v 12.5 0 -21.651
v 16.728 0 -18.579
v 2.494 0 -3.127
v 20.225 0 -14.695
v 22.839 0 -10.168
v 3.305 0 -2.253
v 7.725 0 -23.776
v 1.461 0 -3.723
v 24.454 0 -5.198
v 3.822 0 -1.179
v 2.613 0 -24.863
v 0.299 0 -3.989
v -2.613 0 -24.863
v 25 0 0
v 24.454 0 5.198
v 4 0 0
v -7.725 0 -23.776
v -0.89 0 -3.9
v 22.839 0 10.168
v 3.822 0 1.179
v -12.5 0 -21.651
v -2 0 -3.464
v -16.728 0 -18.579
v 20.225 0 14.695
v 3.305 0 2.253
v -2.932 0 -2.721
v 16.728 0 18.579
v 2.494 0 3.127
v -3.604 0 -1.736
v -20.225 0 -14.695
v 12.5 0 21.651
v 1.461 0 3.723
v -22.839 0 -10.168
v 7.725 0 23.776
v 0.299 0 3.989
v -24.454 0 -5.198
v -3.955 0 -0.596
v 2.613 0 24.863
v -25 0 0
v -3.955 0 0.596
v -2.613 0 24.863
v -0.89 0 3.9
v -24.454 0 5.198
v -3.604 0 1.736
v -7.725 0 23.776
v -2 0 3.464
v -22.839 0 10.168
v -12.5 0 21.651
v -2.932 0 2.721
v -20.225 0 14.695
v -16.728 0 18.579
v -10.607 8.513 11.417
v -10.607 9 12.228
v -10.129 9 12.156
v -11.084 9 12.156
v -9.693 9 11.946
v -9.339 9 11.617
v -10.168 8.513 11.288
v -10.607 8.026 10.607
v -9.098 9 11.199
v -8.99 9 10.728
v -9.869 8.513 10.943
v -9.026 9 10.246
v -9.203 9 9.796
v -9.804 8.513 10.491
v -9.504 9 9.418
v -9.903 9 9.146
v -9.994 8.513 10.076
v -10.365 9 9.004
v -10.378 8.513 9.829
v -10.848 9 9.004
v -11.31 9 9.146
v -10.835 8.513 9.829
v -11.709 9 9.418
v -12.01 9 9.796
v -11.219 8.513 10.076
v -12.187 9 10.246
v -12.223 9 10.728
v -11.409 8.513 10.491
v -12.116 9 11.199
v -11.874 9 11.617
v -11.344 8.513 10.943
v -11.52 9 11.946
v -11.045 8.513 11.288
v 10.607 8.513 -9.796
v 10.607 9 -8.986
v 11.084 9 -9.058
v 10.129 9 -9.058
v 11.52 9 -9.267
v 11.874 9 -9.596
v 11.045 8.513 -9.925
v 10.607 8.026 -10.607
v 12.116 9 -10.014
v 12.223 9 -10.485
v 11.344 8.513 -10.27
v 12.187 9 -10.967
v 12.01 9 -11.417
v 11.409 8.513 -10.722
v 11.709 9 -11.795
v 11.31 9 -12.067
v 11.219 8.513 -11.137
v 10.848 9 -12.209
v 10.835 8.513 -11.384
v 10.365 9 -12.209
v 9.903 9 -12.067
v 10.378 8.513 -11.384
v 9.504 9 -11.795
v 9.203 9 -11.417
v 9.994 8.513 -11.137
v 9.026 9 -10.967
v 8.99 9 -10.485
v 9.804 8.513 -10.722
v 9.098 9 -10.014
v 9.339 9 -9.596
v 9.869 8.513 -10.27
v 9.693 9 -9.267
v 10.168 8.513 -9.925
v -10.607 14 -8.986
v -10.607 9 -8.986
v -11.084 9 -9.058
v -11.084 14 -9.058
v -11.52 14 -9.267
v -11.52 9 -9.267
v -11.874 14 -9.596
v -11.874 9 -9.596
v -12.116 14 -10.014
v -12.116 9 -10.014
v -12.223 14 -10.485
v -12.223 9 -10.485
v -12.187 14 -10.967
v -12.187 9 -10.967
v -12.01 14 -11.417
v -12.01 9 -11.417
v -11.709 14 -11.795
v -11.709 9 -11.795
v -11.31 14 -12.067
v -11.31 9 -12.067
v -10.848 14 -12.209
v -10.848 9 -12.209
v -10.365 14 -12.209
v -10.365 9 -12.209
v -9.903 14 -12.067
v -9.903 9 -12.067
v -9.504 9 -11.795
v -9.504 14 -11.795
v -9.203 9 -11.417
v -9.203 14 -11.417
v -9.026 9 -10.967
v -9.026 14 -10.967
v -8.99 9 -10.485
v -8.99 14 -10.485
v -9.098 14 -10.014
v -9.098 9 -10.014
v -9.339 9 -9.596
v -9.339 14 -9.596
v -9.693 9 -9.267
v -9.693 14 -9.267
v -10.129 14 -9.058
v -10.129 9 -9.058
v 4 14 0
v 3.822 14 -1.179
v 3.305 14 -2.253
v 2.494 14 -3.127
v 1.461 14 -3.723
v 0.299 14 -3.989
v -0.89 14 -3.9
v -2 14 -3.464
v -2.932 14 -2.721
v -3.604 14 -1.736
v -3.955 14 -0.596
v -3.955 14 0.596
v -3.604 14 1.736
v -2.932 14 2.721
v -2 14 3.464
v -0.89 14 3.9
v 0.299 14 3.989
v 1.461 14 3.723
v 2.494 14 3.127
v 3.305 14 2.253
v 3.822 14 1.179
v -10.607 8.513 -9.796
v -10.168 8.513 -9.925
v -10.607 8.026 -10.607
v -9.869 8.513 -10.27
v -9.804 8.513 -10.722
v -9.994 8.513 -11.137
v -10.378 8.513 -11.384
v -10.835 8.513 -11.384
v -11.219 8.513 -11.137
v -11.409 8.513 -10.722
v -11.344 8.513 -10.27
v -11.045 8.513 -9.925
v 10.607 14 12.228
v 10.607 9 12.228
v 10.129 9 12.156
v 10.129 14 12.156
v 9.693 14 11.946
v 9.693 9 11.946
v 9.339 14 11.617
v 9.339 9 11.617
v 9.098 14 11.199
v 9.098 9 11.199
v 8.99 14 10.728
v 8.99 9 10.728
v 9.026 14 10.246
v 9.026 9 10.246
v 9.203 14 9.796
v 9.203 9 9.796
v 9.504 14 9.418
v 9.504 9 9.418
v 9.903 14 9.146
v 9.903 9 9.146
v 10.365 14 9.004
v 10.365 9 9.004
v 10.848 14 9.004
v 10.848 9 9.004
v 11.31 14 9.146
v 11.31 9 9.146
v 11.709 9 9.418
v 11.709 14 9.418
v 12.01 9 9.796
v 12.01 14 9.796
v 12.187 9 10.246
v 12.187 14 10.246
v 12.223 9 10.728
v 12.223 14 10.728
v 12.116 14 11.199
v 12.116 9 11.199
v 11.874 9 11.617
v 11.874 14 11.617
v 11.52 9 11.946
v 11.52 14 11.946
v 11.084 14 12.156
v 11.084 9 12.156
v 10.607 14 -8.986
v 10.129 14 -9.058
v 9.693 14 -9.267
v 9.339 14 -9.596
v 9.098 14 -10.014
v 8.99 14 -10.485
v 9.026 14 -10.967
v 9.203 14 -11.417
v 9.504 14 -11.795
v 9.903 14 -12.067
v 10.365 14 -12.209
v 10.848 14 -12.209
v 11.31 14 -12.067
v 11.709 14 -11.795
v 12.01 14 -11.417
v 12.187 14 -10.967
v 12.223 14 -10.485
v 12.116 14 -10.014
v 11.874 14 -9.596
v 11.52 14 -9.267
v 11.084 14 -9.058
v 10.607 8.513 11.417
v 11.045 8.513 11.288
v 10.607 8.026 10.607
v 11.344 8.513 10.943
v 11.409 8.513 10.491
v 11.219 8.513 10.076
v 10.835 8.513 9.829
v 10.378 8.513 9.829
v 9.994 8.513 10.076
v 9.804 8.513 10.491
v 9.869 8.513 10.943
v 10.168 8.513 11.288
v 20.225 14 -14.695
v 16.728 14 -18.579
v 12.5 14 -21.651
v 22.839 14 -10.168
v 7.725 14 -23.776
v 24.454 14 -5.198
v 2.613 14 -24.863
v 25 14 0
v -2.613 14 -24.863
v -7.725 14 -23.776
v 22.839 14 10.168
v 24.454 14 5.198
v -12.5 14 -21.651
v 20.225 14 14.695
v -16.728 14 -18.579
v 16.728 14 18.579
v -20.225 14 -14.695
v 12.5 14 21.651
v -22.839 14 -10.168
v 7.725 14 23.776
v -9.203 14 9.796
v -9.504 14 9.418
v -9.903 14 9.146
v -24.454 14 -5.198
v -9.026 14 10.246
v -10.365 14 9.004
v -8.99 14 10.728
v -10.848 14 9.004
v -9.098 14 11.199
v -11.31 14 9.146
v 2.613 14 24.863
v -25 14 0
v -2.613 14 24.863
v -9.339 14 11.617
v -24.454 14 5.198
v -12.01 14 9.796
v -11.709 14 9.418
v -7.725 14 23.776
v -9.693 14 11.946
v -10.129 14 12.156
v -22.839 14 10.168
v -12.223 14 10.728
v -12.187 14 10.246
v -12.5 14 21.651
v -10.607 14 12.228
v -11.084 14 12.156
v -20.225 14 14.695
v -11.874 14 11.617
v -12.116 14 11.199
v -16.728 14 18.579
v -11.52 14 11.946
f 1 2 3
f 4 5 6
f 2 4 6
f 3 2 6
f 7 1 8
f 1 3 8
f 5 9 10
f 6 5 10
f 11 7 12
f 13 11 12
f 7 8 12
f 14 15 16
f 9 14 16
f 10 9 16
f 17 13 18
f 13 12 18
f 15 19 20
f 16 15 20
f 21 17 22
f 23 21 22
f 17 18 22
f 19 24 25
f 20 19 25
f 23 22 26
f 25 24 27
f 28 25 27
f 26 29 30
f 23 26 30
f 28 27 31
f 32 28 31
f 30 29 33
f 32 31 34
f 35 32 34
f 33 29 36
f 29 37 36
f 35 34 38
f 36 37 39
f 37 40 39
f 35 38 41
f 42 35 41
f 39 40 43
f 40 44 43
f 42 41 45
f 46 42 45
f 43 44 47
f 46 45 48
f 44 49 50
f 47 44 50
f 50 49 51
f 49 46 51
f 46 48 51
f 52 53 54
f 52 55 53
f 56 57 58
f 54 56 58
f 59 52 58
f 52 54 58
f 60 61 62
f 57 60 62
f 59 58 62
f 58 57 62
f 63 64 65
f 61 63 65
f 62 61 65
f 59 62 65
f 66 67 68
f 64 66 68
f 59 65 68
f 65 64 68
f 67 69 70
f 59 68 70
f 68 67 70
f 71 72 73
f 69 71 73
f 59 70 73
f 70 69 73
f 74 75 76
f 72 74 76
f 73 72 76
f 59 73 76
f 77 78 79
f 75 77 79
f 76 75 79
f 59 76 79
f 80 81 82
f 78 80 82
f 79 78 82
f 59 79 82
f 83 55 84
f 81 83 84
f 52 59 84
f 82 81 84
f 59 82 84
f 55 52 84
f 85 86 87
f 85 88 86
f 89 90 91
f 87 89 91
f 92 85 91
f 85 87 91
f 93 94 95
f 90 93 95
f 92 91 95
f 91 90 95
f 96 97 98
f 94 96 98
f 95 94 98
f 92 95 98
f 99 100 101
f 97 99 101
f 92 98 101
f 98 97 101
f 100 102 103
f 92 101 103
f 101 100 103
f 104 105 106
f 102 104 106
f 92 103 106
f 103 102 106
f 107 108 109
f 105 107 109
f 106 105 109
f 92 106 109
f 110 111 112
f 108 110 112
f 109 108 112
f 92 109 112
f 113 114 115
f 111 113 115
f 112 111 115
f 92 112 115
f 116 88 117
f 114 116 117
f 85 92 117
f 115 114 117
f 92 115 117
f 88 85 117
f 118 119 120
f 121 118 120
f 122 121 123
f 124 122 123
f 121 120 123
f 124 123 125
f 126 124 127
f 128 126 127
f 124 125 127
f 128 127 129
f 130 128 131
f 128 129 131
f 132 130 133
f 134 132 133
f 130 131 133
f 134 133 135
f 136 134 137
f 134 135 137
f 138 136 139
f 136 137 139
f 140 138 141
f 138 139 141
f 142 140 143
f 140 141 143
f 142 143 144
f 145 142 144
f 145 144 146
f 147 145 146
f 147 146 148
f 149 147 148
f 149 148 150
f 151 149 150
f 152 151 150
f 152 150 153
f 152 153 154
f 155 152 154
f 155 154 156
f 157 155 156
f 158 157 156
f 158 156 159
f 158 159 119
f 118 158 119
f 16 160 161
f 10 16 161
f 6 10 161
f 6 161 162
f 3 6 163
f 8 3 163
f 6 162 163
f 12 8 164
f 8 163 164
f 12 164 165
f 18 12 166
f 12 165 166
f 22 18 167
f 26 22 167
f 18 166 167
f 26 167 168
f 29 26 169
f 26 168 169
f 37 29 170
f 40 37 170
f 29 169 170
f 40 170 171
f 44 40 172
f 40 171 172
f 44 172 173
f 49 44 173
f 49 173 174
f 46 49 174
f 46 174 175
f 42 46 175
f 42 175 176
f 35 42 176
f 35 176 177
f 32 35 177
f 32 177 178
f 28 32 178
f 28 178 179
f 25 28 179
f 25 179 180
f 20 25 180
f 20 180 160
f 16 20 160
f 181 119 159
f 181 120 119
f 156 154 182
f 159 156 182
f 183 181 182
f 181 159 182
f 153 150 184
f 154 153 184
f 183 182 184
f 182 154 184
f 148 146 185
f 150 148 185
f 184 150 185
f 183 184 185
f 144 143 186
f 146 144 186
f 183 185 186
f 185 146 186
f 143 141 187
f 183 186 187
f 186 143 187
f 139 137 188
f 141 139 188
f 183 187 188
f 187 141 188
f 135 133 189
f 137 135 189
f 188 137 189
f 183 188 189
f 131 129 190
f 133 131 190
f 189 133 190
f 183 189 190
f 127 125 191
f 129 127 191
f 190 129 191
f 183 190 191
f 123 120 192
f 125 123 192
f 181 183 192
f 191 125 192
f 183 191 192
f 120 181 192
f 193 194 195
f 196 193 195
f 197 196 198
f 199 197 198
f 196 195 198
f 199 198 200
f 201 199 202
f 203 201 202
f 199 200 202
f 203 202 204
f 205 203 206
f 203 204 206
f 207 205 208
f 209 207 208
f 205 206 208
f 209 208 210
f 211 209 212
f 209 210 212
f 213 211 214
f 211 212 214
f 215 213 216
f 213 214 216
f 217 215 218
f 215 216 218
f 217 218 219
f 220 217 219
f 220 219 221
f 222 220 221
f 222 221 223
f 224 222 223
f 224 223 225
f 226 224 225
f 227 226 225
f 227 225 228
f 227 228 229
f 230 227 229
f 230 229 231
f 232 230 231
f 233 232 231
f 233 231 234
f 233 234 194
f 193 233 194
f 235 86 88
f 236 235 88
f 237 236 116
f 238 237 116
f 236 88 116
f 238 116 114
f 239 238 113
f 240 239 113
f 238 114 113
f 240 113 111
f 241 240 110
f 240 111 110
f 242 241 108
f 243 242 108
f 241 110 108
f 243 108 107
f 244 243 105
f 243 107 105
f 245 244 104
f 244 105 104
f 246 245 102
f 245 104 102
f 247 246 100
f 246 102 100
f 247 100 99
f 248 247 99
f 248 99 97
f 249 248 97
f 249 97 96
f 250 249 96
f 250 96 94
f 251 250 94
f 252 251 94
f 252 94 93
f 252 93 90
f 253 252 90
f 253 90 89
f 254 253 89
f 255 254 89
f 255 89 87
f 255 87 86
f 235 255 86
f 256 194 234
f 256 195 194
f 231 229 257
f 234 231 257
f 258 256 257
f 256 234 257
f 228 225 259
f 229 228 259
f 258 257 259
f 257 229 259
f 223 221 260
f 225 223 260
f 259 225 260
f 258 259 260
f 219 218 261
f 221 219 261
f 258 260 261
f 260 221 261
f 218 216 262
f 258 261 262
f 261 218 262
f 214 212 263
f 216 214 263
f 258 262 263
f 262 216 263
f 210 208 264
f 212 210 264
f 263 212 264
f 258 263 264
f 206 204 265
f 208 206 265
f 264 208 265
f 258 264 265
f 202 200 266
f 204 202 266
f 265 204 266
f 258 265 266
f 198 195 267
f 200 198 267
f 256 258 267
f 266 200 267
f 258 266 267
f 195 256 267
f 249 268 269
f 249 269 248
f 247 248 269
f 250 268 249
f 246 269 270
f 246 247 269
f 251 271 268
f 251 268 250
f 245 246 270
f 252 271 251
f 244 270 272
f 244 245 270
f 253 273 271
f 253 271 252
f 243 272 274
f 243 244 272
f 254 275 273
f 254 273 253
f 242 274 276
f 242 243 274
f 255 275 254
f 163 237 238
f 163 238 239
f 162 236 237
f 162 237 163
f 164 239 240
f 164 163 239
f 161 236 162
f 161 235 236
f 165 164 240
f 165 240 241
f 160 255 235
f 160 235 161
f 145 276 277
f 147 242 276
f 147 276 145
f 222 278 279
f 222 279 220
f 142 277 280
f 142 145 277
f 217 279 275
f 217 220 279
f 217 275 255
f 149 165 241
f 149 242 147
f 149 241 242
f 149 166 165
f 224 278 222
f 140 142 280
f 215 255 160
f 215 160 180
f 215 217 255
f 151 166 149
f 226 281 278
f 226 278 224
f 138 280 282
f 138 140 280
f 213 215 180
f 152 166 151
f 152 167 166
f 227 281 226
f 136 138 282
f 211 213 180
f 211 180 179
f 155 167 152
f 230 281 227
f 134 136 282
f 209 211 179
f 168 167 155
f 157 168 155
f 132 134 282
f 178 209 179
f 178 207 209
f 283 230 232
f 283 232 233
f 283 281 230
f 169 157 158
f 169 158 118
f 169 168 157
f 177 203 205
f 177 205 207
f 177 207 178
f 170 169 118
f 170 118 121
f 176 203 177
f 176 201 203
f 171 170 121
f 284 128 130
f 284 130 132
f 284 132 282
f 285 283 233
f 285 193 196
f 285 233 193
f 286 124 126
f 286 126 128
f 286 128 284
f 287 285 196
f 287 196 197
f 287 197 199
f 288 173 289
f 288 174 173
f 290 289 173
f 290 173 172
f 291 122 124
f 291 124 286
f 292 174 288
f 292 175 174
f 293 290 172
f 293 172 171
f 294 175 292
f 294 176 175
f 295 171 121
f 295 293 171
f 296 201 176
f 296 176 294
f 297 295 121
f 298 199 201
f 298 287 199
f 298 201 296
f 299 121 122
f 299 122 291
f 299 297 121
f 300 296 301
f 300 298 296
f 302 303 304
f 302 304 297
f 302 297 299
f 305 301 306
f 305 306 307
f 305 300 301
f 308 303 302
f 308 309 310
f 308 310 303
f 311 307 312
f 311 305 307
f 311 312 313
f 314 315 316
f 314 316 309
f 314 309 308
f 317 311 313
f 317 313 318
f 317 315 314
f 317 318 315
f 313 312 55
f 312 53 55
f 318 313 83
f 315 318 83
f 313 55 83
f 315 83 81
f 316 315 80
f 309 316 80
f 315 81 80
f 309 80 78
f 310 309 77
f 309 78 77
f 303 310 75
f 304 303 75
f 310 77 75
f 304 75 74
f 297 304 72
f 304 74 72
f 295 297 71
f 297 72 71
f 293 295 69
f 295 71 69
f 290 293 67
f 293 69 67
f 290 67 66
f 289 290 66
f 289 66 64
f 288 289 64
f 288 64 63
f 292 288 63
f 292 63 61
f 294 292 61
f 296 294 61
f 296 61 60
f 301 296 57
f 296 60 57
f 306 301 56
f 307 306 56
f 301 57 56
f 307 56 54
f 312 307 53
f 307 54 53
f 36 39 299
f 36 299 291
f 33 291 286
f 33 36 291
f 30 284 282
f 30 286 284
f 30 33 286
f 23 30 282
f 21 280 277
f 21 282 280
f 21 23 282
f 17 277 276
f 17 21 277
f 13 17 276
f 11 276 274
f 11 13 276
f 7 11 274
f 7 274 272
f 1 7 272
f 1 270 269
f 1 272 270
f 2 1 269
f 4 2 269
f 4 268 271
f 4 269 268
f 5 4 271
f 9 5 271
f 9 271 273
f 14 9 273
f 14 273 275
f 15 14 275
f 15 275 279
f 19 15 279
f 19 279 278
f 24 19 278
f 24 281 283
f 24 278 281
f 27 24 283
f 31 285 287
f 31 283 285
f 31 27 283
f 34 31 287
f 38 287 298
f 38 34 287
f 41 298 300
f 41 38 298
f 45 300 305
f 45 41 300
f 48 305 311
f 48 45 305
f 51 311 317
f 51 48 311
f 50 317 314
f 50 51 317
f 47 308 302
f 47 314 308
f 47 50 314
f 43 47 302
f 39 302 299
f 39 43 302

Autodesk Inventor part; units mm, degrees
ref_plane "YZ Plane" through (0, 0, 0) normal (1, 0, 0) x (0, 1, 0)
ref_plane "XZ Plane" through (0, 0, 0) normal (0, 1, 0) x (-1, 0, 0)
ref_plane "XY Plane" through (0, 0, 0) normal (0, 0, 1) x (1, 0, 0)
sketch "スケッチ5" plane through (0, 0, 0) normal (0, 1, 0) x (-1, 0, 0)
  circle A0 centre (0, 0) radius 25
  dimension "d23" = 50
extrude "押し出し2" add sketch "スケッチ5" along normal blind 14
sketch "スケッチ6" plane through (0, 14, 0) normal (0, 1, 0) x (1, 0, 0)
  circle A0 centre (0, 0) radius 4
  dimension "d26" = 8
extrude "押し出し3" cut sketch "スケッチ6" against normal blind 14
sketch "スケッチ7" plane through (0, 14, 0) normal (0, 1, 0) x (1, 0, 0)
  line L0 (0, 0) -> (10.6066, 10.6066)
  line L1 (0, 0) -> (15, 0) construction
  point P0 (-10.6066, 10.6066)
  point P1 (-10.6066, -10.6066)
  point P2 (10.6066, -10.6066)
  dimension "d29" = 15
  dimension "d30" = 45
  dimension "d33" = 360
hole "穴2" at (10.6066, 14, -10.6066) at (-10.6066, 14, -10.6066) at (-10.6066, 14, 10.6066) at (10.6066, 14, 10.6066) direction (0, -1, 0) diameter 3.242 depth 5 tip angle 118 thread size "M4x0.7" class "6H" standard "ISO Metric profile"
properties part number "Stator" material "ステンレス鋼"
